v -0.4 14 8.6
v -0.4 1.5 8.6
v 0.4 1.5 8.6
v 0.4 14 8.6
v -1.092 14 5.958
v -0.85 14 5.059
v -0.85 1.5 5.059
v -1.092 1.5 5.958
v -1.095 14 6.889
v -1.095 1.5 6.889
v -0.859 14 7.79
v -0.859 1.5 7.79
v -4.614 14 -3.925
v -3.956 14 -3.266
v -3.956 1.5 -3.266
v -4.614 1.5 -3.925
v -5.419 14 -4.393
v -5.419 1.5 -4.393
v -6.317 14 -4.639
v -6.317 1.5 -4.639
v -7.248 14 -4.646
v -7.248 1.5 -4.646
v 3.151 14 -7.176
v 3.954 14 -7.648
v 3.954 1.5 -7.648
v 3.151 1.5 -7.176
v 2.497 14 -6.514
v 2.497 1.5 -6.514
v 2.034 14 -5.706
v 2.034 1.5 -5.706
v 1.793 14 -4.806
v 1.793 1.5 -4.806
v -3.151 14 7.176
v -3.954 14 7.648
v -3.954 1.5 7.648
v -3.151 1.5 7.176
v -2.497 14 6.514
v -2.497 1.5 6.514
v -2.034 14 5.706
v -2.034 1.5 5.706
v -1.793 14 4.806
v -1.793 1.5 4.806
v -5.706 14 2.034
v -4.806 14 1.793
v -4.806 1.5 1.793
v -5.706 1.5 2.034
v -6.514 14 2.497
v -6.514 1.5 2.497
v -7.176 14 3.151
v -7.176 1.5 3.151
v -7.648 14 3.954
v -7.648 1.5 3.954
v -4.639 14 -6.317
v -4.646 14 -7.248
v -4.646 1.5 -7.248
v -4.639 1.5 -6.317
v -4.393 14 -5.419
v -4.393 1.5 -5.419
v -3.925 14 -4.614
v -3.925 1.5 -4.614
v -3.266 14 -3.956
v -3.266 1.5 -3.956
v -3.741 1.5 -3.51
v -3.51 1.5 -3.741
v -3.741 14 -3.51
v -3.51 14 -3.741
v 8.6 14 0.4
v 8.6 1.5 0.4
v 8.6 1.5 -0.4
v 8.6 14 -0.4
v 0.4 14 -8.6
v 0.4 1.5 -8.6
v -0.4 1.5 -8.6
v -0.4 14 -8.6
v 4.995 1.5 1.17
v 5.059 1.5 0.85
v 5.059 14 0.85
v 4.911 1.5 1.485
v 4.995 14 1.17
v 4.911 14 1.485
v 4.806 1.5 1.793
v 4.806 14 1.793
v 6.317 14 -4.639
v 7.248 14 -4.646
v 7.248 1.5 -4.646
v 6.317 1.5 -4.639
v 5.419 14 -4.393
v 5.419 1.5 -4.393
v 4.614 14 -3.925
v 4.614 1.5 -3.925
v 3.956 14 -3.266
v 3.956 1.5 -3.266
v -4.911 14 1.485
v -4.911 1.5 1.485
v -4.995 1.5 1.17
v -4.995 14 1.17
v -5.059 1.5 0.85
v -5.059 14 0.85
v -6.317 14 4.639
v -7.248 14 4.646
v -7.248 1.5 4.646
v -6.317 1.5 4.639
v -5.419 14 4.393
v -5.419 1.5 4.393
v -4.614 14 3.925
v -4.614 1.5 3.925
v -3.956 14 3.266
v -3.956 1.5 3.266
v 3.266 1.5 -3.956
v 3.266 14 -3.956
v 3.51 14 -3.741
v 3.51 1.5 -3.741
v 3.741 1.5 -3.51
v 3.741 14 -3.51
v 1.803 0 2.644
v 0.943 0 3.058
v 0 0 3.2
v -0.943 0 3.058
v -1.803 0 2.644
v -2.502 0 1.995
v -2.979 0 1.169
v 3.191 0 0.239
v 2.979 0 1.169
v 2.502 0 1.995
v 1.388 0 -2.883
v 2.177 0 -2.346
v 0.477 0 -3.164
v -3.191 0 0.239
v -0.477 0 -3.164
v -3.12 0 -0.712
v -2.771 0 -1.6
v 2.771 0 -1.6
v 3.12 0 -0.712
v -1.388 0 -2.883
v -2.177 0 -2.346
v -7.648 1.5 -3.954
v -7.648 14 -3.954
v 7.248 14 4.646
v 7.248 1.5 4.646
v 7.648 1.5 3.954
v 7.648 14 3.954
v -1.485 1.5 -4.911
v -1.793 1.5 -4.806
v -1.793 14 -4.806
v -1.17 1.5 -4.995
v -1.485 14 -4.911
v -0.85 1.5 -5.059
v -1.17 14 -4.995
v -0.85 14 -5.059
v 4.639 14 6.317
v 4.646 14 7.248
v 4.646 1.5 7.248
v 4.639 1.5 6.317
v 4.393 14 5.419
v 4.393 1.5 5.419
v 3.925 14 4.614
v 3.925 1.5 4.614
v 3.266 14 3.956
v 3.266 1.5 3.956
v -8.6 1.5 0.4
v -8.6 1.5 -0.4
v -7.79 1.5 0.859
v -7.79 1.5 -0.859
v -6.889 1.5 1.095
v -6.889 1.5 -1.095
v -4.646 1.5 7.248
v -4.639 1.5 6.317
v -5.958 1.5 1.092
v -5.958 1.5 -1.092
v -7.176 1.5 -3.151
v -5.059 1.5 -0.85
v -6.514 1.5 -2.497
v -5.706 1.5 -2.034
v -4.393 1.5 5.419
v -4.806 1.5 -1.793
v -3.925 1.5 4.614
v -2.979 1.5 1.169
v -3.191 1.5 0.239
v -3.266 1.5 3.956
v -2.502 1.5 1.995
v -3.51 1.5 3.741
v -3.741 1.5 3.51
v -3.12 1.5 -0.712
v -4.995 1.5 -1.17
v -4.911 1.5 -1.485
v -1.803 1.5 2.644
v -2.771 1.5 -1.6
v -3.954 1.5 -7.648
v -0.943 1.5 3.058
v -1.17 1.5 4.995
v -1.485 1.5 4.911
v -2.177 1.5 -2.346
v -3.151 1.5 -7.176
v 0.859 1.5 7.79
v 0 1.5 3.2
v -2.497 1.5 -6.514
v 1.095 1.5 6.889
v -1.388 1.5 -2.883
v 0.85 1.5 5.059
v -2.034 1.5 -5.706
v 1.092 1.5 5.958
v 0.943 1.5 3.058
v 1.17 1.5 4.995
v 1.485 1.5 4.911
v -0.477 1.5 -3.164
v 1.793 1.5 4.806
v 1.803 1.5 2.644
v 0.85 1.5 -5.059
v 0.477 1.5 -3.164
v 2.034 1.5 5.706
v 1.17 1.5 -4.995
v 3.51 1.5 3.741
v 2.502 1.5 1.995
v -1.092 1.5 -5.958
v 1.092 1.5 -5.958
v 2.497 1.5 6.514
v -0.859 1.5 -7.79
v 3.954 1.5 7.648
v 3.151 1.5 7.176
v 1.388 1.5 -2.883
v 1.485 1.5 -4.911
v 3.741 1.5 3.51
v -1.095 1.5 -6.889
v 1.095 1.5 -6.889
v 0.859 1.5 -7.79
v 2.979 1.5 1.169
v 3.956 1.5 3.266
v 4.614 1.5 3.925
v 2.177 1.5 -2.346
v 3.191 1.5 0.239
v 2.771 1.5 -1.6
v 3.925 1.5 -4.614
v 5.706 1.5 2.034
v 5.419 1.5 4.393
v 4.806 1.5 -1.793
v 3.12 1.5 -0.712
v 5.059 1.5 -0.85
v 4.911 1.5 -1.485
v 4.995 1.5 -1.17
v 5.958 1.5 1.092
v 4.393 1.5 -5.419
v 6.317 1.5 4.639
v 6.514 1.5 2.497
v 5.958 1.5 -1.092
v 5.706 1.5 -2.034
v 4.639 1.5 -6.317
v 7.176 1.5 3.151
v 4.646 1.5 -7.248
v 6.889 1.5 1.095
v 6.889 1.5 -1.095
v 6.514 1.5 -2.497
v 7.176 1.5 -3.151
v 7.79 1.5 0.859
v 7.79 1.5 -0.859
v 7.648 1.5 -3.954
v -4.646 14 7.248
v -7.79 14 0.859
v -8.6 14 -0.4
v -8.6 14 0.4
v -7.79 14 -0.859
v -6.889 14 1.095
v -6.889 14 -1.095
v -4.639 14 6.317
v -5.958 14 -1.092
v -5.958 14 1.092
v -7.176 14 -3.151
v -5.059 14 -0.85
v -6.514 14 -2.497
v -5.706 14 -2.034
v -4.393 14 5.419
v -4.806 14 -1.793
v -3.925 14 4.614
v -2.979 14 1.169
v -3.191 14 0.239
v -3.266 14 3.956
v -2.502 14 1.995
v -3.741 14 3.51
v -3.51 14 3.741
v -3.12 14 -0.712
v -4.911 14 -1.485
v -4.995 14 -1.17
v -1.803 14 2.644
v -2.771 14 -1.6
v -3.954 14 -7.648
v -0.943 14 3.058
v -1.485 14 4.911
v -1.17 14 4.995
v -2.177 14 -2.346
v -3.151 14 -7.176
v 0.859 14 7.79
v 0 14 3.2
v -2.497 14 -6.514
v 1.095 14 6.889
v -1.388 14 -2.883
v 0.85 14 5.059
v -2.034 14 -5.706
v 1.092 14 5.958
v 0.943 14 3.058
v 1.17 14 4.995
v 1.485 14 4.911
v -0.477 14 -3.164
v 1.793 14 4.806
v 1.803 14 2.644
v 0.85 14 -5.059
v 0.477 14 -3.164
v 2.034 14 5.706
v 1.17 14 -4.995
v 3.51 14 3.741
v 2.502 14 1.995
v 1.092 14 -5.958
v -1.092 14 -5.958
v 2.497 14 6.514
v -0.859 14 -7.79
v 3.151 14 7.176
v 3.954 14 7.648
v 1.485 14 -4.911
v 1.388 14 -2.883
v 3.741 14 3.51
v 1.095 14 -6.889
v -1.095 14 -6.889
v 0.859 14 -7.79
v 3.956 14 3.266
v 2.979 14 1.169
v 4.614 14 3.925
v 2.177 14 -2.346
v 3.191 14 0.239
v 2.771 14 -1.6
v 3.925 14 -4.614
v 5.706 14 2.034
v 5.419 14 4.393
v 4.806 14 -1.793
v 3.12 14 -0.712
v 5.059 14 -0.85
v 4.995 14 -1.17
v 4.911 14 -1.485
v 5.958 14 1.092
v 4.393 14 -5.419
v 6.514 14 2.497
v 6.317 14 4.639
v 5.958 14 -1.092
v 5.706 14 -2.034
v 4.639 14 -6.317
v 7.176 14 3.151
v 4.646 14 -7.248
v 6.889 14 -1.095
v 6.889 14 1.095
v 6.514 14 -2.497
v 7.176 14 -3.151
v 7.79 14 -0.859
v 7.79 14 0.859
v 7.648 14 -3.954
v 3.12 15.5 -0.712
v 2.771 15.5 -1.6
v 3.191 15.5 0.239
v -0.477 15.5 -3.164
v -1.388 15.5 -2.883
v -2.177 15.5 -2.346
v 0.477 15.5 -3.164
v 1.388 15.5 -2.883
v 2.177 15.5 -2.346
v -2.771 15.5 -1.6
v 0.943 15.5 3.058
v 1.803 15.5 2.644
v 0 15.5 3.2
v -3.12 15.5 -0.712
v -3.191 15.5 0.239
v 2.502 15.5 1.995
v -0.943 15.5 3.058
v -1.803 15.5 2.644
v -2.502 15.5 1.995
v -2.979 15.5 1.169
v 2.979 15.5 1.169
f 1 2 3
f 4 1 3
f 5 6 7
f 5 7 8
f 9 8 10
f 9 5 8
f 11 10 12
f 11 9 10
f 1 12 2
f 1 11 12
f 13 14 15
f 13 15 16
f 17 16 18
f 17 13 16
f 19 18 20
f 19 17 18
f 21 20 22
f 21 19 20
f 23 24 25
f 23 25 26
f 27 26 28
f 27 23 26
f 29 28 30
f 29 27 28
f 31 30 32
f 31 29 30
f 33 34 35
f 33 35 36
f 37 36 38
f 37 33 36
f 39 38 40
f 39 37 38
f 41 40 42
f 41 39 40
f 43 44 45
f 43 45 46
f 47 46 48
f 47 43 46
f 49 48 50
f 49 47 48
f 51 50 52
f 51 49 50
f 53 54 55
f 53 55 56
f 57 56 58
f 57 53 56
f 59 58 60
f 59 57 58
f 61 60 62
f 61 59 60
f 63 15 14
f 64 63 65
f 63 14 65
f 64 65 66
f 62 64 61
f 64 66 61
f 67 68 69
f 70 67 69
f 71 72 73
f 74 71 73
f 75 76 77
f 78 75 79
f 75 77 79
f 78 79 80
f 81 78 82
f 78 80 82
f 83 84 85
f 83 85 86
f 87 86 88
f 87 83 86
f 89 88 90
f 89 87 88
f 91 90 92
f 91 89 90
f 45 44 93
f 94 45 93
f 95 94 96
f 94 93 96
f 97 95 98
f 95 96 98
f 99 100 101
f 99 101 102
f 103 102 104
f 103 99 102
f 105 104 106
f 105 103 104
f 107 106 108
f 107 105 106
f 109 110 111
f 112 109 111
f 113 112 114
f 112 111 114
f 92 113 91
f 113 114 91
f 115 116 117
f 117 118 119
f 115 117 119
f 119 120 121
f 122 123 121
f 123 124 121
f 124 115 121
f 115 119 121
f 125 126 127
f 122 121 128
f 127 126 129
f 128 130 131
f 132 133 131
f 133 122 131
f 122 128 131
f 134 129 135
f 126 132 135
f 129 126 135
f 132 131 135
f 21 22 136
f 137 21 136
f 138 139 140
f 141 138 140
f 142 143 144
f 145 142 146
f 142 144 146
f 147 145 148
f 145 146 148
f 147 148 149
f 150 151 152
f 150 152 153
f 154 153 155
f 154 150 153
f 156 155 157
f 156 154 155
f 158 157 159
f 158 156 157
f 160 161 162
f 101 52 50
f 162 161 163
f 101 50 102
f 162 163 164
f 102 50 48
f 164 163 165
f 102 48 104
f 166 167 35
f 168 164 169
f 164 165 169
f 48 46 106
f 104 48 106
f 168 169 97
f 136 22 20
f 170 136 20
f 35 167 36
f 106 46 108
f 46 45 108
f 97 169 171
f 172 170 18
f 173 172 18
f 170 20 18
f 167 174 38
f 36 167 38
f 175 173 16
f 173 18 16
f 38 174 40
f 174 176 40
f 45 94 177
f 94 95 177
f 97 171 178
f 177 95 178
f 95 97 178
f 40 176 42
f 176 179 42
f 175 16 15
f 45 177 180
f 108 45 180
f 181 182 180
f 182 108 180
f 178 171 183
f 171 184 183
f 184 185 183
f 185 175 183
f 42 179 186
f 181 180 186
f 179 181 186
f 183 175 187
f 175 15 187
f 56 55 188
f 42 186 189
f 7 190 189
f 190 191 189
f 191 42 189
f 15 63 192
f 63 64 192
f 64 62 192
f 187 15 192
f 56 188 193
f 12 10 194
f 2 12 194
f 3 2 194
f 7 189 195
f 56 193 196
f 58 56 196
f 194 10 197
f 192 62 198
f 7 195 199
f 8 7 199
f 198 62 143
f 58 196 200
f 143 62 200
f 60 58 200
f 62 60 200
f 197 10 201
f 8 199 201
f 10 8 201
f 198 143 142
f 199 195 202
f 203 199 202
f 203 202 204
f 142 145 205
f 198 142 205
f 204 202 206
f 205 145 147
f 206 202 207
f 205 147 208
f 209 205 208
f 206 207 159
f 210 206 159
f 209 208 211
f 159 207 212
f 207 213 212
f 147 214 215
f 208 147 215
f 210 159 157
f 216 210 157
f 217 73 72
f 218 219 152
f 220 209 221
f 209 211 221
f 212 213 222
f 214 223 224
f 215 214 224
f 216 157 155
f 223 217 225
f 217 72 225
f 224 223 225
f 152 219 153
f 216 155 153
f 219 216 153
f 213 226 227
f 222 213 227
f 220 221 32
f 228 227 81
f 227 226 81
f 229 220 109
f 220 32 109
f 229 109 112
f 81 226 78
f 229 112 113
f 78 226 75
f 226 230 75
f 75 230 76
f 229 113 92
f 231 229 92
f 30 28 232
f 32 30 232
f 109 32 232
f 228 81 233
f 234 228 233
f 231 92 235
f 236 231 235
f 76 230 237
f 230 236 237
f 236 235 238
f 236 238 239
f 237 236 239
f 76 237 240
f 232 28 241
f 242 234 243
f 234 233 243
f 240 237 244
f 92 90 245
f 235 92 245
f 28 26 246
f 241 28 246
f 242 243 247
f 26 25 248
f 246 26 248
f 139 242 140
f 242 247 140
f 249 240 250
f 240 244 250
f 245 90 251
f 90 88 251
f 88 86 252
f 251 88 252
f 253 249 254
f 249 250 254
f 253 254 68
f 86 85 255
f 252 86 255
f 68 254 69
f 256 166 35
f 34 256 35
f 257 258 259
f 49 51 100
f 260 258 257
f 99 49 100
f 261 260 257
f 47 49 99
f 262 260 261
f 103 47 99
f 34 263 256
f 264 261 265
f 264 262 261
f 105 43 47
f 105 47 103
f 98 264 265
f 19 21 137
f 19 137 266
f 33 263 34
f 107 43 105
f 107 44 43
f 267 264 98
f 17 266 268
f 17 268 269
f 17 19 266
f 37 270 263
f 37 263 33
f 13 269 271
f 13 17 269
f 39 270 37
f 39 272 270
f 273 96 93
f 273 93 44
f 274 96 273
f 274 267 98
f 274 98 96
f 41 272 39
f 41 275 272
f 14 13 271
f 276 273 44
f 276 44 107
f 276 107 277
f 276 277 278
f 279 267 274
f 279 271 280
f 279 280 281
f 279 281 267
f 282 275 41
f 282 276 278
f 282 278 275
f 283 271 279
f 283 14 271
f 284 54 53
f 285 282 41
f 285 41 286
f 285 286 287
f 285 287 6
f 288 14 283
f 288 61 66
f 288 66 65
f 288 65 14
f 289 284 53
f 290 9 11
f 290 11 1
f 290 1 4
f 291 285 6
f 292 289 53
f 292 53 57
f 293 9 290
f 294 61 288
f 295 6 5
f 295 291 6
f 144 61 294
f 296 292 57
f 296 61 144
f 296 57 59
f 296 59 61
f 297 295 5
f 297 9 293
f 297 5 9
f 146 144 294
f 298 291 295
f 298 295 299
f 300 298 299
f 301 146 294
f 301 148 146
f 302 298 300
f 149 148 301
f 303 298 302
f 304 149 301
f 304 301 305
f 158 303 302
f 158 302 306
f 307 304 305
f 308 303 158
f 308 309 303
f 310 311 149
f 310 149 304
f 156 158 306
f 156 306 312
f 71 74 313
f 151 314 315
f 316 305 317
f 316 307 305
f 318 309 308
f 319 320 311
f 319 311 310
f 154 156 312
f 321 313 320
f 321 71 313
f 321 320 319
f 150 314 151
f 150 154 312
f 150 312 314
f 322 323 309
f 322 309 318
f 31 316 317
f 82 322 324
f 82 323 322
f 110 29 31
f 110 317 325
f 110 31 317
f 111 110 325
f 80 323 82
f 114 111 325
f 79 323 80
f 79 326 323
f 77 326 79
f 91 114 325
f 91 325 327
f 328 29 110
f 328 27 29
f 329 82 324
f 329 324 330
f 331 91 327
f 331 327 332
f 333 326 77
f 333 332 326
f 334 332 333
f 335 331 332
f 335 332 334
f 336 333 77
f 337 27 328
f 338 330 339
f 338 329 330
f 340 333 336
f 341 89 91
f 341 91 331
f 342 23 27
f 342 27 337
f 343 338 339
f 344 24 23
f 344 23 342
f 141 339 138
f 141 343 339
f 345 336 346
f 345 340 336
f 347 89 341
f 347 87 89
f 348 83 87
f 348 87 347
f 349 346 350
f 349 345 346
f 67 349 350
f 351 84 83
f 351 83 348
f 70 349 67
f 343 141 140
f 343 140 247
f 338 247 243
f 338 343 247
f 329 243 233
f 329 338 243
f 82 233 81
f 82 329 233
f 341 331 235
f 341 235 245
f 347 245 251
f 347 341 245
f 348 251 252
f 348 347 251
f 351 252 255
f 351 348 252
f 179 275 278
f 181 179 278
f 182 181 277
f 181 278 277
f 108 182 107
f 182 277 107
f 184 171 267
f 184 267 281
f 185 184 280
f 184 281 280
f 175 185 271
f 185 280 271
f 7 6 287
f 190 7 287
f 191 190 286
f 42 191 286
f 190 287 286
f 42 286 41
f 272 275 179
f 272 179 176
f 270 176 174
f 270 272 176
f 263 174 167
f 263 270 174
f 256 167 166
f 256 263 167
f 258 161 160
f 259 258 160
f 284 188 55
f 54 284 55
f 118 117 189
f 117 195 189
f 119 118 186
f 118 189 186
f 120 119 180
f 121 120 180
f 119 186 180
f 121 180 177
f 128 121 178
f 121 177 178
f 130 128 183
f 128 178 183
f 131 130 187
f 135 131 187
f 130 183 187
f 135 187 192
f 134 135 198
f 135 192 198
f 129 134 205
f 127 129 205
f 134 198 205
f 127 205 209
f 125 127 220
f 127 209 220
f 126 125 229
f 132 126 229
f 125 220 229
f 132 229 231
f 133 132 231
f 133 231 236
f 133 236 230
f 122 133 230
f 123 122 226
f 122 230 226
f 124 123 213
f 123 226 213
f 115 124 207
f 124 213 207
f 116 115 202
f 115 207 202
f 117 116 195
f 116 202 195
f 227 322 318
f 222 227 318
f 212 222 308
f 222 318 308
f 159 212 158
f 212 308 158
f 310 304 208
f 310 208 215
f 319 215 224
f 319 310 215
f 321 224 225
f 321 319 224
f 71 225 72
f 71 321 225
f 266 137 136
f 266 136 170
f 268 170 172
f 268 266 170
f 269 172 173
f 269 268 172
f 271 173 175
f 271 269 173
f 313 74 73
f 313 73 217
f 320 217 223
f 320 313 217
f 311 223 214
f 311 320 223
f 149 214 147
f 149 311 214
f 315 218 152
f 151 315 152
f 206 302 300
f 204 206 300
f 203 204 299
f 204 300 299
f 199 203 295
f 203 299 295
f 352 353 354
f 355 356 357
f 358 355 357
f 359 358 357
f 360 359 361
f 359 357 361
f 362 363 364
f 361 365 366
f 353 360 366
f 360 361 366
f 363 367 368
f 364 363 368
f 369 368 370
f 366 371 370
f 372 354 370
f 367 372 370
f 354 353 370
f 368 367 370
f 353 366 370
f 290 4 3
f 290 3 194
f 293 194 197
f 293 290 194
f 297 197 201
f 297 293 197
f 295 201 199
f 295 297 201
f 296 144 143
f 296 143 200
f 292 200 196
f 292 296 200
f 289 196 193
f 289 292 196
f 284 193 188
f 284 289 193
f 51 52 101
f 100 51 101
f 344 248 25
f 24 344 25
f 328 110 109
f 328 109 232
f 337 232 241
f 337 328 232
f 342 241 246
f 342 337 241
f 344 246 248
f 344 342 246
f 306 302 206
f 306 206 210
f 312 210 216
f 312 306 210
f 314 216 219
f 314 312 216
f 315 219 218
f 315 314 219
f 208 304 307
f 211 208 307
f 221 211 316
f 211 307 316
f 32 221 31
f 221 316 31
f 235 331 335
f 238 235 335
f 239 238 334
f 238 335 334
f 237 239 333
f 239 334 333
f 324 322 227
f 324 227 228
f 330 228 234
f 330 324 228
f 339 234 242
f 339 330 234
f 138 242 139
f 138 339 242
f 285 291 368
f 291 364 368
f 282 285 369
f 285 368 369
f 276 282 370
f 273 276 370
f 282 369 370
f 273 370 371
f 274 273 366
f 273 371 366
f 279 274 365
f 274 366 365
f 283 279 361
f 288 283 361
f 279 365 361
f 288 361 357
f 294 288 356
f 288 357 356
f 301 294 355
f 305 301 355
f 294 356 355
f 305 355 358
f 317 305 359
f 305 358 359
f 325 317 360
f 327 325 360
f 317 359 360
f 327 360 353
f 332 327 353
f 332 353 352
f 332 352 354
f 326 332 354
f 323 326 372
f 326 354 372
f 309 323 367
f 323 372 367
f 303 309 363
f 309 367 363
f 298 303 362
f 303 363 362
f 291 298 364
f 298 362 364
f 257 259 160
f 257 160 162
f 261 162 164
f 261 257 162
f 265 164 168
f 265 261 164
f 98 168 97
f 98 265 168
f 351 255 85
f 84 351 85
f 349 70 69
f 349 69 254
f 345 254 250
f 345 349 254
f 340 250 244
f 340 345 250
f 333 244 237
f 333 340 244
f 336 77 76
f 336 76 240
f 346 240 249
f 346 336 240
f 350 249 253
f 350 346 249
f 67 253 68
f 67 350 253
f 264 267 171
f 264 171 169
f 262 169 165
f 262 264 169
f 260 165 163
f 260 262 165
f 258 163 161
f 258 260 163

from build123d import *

# Parameters (mm, degrees)
BOSS_EXTRUDE2_DEPTH = 12.5
CIRPATTERN1_COUNT   = 12


with BuildPart() as part:
    # Sketch1 → Revolve1 (revolve)
    with BuildSketch(Plane(origin=(0, 0, 0), x_dir=(0, 0, -1), z_dir=(1, 0, 0)), mode=Mode.PRIVATE) as revolve1_sk:
        Polygon((0, 0), (3.2, 0), (3.2, 1.5), (5.13, 1.5), (5.13, 14), (3.2, 14), (3.2, 15.5), (0, 15.5), align=None)
    revolve(revolve1_sk.sketch.rotate(Axis((0, 15.5, 0), (0, -1, 0)), 180), axis=Axis((0, 15.5, 0), (0, -1, 0)))

    # Sketch2 → Boss-Extrude2 (add)
    with BuildSketch(Plane(origin=(0, 14, 0), x_dir=(1, 0, 0), z_dir=(0, 1, 0))):
        with BuildLine():
            Line((0.4, 8.6), (-0.4, 8.6))
            ThreePointArc((-0.4, 8.6), (-1.094743674, 6.889243261), (-0.85, 5.059090827))
            Line((-0.85, 5.059090827), (-0.85, 4.768997596))
            Line((-0.85, 4.768997596), (0.85, 4.768997596))
            Line((0.85, 4.768997596), (0.85, 5.059090827))
            ThreePointArc((0.85, 5.059090827), (1.094743674, 6.889243261), (0.4, 8.6))
        make_face()
    boss_extrude2 = extrude(amount=-BOSS_EXTRUDE2_DEPTH)

    # CirPattern1: Boss-Extrude2 ×12 about axis
    cirpattern1_axis = Axis((0, 0, 0), (0, 1, 0))
    for i in range(1, CIRPATTERN1_COUNT):
        add(boss_extrude2.rotate(cirpattern1_axis, i * 360 / CIRPATTERN1_COUNT))


solid = part.part
